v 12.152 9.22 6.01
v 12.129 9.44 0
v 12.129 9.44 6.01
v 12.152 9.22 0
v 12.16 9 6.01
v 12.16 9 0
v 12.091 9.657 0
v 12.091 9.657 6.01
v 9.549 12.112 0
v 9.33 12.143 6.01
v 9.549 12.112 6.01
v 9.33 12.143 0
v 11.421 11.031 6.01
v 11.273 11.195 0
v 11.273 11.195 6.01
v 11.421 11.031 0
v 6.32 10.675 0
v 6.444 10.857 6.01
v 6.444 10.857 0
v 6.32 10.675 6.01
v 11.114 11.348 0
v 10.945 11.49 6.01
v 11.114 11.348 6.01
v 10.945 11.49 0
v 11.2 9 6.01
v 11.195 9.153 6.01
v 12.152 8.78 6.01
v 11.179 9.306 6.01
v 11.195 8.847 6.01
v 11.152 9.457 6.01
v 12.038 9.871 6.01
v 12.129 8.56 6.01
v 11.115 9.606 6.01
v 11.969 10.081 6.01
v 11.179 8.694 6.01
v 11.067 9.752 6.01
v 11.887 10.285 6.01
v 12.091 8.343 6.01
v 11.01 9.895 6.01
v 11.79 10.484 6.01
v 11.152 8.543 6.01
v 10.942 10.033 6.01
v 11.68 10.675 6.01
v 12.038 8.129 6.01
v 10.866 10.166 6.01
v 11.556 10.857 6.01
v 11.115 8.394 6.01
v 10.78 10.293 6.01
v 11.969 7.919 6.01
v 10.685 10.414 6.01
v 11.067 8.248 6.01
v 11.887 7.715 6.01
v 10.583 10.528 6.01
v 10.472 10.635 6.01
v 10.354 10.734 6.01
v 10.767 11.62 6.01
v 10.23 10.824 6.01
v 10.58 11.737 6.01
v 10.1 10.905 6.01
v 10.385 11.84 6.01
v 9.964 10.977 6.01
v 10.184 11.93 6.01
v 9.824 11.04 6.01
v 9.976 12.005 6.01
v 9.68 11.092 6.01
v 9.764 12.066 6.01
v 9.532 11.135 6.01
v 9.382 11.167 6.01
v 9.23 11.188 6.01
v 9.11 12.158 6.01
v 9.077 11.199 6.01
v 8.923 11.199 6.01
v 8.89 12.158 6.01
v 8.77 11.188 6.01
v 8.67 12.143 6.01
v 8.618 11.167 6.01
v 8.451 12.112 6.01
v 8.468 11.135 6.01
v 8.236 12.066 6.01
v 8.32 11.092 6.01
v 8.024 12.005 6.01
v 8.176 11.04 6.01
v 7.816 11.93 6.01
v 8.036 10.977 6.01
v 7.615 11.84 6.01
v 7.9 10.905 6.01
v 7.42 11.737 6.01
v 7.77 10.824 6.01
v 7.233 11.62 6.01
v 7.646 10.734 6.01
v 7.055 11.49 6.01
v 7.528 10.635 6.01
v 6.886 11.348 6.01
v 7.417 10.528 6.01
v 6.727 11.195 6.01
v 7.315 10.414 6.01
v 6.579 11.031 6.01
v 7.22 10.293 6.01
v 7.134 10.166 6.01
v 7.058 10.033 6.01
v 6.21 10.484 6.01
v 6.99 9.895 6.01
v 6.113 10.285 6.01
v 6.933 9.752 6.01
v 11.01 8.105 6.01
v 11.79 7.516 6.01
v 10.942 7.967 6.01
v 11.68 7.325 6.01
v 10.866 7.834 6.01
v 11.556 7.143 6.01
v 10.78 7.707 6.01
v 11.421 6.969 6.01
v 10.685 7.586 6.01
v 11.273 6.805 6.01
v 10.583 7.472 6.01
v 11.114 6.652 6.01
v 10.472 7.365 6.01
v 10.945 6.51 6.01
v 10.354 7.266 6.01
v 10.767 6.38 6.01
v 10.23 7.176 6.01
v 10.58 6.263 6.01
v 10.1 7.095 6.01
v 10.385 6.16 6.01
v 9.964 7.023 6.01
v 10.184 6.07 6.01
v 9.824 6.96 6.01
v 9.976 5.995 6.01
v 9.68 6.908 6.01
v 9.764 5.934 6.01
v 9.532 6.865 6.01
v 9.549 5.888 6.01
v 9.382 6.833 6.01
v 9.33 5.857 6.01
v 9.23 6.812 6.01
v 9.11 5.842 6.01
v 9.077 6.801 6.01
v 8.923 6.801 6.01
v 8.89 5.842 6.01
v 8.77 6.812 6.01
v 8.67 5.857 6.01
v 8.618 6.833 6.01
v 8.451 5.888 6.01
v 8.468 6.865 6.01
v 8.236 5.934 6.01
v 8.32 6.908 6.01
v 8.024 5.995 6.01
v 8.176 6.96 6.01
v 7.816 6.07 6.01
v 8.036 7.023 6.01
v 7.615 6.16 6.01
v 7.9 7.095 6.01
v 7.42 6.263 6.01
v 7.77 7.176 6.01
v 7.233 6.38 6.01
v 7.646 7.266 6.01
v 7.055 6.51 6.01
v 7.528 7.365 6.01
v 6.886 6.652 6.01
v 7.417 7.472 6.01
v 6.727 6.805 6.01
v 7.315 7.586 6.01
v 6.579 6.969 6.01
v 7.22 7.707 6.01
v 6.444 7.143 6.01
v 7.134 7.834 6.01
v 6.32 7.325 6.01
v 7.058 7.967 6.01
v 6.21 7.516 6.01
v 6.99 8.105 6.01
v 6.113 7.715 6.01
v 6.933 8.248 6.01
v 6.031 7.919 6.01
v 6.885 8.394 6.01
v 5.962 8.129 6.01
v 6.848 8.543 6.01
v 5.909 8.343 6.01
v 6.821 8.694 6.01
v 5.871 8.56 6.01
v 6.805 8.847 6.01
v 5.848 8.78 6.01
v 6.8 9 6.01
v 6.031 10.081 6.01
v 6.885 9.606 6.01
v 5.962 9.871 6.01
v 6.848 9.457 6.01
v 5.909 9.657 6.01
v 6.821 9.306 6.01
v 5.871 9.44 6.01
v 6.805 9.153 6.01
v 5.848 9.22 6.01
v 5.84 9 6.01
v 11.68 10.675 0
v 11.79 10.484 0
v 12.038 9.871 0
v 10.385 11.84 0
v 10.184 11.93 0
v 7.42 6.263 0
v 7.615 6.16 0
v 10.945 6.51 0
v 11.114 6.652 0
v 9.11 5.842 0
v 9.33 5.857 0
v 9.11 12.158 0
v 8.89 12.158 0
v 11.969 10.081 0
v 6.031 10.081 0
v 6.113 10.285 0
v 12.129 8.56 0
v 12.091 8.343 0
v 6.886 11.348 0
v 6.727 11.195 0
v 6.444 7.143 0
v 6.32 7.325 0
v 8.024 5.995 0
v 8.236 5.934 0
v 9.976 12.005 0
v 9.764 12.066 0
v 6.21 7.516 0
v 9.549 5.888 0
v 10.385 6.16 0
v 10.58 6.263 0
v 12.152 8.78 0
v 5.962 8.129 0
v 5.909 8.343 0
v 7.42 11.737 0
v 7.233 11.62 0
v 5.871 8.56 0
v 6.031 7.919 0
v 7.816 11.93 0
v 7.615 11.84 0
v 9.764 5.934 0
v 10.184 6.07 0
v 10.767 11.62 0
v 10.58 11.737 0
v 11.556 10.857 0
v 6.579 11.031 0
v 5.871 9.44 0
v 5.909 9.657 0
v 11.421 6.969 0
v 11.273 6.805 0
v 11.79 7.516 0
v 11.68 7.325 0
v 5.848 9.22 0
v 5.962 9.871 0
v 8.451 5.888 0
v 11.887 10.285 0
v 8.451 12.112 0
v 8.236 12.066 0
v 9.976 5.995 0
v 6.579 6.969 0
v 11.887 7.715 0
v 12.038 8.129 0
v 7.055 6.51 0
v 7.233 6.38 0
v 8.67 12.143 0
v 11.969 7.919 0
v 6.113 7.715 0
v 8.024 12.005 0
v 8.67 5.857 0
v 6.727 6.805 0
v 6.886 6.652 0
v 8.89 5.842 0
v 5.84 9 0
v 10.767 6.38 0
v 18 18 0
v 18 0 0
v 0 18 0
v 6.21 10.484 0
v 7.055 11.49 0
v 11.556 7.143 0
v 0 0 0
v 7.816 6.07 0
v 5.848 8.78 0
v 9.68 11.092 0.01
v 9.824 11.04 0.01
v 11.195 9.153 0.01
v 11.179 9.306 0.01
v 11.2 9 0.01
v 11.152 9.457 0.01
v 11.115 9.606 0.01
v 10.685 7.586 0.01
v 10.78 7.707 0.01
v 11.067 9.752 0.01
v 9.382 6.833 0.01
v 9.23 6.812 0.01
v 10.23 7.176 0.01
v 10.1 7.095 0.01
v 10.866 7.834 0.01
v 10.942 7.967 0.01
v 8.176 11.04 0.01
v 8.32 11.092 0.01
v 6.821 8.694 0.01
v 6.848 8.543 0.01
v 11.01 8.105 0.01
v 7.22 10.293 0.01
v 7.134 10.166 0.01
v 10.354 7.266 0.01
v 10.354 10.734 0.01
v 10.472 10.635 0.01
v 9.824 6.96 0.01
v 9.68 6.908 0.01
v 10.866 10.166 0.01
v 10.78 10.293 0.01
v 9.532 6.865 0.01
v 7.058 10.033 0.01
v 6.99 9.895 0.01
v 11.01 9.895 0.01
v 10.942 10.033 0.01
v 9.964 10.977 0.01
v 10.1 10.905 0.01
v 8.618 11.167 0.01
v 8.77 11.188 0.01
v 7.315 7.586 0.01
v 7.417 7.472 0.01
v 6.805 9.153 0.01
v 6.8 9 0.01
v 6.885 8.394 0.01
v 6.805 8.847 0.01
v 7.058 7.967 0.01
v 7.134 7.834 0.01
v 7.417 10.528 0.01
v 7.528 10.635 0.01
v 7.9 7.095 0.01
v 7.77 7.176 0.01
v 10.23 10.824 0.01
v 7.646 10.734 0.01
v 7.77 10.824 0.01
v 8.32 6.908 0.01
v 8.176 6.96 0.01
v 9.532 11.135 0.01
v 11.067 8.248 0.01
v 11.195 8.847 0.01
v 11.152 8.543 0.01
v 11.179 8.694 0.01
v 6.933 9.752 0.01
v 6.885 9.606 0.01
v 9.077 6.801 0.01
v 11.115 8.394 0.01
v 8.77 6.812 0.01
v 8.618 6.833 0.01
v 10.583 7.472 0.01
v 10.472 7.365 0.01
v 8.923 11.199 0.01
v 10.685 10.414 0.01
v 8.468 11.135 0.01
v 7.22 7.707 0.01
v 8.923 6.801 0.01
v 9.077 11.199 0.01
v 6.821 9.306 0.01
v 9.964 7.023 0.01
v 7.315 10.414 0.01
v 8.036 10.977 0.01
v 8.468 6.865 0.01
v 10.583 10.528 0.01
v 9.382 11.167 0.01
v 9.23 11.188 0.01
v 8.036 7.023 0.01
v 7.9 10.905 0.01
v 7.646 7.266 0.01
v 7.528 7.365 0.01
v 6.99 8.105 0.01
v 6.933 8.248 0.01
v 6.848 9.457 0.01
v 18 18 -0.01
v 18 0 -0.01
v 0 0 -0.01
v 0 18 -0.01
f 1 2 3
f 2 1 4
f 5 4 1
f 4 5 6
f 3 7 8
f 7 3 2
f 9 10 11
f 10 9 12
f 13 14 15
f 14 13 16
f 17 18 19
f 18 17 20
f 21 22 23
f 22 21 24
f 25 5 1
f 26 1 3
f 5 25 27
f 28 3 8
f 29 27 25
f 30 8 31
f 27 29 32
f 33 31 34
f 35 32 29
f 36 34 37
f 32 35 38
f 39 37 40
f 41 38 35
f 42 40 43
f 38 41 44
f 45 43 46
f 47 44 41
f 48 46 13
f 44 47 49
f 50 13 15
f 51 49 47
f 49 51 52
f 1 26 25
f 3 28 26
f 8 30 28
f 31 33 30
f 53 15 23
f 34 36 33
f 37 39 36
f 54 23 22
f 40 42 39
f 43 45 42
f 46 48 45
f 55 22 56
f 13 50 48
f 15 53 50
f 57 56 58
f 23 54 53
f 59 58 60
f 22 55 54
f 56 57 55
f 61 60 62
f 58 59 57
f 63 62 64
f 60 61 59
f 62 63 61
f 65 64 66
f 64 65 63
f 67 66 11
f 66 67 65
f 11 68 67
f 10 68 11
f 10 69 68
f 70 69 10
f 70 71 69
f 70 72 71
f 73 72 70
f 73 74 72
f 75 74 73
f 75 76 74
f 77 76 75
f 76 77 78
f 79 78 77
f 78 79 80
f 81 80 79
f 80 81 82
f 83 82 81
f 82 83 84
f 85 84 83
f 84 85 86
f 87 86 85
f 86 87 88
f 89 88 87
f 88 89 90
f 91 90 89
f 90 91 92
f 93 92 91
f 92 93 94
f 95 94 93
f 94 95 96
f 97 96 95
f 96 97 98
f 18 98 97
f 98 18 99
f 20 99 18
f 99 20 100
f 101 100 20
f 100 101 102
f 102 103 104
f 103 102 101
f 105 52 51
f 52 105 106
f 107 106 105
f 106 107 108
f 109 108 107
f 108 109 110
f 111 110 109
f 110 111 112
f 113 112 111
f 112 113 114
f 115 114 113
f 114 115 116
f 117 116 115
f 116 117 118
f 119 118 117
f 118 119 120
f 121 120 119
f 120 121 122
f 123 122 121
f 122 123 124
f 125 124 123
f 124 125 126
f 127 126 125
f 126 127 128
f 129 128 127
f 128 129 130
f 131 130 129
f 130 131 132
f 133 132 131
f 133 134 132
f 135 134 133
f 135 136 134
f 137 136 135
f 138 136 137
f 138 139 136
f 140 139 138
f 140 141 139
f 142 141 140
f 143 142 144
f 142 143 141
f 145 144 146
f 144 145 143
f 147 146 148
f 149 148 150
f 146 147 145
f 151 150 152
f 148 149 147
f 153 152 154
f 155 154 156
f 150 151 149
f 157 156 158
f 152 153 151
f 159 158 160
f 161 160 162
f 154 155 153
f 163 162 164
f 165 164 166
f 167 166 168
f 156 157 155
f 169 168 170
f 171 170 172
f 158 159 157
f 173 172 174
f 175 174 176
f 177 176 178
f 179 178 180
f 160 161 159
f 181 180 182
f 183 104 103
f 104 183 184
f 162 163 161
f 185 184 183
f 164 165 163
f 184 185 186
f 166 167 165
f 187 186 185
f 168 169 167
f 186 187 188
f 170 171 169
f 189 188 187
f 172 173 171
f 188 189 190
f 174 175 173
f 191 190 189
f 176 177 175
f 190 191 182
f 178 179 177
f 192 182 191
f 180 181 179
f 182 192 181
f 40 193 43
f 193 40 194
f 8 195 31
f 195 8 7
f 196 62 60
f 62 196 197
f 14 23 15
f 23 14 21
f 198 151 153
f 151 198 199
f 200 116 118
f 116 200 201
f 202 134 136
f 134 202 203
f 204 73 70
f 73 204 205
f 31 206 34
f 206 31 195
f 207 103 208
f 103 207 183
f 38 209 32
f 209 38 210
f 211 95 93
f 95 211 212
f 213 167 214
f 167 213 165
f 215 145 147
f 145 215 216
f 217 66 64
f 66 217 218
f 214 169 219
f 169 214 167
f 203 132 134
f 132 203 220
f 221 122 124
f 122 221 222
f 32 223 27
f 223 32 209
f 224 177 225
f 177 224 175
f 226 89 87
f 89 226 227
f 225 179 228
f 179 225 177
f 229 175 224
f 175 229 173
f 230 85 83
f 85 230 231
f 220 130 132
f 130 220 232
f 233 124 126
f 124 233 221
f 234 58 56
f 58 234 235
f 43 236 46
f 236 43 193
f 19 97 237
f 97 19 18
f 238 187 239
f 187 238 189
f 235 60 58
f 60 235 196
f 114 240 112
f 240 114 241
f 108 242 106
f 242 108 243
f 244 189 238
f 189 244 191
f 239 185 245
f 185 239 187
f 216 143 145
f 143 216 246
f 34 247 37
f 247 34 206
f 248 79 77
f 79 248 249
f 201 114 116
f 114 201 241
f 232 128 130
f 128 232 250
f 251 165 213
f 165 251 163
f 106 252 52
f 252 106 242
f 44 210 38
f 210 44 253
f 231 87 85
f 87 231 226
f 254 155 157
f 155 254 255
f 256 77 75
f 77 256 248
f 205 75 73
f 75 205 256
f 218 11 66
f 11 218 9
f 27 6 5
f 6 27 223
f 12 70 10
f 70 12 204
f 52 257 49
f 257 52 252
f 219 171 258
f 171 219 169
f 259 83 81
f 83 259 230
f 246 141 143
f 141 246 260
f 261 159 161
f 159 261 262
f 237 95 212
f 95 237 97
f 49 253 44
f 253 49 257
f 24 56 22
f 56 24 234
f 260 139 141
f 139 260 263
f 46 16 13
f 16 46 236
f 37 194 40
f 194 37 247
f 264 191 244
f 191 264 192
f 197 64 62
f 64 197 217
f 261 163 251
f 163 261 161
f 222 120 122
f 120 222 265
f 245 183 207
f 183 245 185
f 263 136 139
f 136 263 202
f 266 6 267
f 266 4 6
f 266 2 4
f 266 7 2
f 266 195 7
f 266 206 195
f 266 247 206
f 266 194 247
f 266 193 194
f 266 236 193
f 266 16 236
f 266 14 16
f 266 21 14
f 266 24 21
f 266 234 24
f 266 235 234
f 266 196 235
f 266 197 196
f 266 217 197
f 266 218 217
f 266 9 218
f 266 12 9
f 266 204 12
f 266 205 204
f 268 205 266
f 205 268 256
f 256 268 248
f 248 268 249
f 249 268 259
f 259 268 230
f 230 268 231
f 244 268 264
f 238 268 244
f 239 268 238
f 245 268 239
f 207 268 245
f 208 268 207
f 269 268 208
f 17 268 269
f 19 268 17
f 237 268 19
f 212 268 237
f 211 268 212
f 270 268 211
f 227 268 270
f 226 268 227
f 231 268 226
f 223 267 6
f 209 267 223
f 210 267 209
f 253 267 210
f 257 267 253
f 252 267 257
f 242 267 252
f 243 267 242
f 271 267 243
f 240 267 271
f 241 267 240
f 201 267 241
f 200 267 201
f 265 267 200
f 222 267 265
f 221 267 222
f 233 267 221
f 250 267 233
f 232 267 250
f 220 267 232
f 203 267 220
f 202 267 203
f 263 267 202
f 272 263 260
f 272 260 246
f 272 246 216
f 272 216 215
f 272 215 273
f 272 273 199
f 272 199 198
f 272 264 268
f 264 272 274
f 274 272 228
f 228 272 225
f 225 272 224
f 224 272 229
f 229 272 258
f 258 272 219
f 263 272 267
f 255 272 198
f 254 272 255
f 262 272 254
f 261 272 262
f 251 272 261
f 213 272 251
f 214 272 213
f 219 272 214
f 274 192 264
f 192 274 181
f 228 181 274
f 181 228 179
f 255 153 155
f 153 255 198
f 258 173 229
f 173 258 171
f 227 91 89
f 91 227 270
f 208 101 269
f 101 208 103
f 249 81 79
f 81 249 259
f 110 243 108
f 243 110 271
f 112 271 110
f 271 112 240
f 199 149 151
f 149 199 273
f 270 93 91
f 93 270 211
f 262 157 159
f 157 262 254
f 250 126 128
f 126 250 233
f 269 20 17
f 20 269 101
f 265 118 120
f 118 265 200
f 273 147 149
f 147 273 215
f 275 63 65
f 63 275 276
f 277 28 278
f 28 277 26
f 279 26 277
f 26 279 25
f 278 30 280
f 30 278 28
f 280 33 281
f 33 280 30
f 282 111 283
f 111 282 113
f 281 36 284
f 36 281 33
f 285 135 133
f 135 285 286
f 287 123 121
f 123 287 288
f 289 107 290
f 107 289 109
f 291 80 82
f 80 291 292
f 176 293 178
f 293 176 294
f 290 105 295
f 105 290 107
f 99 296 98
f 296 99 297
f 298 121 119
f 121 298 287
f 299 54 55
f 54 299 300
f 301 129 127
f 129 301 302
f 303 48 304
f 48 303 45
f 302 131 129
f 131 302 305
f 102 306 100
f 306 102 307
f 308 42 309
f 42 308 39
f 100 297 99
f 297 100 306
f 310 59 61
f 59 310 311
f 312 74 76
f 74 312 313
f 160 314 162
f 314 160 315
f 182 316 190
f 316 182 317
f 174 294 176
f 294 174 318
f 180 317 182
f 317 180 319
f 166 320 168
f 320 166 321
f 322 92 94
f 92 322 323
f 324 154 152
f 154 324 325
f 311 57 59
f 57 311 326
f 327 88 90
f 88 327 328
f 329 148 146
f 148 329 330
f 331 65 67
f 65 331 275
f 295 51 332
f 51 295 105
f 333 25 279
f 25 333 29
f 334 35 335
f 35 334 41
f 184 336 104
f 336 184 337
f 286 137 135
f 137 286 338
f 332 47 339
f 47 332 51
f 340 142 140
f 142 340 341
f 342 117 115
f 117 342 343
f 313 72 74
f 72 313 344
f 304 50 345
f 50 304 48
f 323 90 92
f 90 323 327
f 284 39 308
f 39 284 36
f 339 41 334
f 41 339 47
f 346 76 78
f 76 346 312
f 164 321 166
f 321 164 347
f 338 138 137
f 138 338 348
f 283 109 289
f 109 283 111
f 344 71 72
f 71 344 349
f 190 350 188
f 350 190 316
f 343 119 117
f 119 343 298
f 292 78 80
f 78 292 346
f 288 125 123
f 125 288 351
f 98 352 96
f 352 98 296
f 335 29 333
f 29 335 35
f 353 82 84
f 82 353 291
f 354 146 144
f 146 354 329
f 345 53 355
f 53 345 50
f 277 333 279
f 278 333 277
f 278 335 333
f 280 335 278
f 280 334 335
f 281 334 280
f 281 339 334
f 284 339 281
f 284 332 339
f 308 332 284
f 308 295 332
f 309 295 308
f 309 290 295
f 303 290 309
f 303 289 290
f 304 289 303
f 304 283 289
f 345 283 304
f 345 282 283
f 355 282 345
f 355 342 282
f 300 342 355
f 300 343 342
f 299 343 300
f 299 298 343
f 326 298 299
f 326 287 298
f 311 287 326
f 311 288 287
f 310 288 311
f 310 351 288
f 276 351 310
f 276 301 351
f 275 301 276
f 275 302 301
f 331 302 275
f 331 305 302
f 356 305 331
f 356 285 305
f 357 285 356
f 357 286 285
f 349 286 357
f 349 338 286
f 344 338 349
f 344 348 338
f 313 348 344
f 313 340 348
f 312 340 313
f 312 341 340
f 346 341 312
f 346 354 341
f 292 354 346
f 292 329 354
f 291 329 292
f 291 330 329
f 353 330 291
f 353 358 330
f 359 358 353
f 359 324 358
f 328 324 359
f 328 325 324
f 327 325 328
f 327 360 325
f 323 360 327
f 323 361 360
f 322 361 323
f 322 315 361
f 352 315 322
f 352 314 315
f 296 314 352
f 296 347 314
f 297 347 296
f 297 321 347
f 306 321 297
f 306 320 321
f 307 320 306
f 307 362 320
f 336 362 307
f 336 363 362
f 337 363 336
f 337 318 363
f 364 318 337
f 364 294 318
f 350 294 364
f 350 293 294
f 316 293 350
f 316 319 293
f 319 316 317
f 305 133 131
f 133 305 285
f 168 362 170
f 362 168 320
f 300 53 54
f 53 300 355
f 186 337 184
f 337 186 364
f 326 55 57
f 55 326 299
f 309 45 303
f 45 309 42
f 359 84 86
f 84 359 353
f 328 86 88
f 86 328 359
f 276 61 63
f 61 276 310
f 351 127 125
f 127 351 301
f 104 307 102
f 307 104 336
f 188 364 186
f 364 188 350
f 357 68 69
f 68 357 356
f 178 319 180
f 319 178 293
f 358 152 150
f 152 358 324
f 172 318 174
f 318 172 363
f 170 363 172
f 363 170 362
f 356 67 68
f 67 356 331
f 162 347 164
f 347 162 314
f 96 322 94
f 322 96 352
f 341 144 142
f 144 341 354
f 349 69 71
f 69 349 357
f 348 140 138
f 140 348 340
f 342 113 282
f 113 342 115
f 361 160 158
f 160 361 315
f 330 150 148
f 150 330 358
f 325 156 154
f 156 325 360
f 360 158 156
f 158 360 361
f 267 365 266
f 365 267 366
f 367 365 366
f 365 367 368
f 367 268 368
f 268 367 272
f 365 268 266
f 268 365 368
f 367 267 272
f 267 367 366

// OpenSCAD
// file: ../Base/PlacementOptions.scad
// Fischertechnik Box Foundation
// Placement Options

// Alignment
NoAlign = 0;
AlignLeft = 1;
AlignBottom = 2;
AlignCenter = 3;
AlignRight = 4;
AlignTop = 5;

// Element rotation degree steps
rotations = [0, -90, -180, -270];

// Rotation
NoRotation = 0;
Rotate0 = 0;
Rotate90 = 1;
Rotate180 = 2;
Rotate270 = 3;

// Docking (seen from above)
NoDock = -1;
DockLeft = 0;
DockTop = 1;
DockRight = 2;
DockCorner = 2;
DockBottom = 3;

// Web corners
LowerLeft = 0;
UpperLeft = 1;
UpperRight = 2;
LowerRight = 3;

// Web position relative to corner
LeftOfCorner = 0;
RightOfCorner = 1;
// file: ../Base/Boxes.scad
// Fischertechnik Box Foundation
// Pre-designed Boxes

use <Constants.scad>

include <PlacementOptions.scad>

box190Width = 190;
box190Depth = 130;
box130Width = 130;
box130Depth = 95;
boxUsageHeight = 33.9;
boxWallThickness = 2.4;
boxBaseThickness = 1.0;
boxWebWidth = 3.0;

// getBoxWallThickness()
// Gets the wall thickness of a Fischertechnik Box

function getBoxWallThickness() = boxWallThickness;

// Gets the usable height of a fischertechnik box
function getBoxUsageHeight() = boxUsageHeight;

// Gets the thickness of the Fischertechnik box base.
function getBoxBaseThickness() = boxBaseThickness;

// Gets the width of a box web
function getBoxWebWidth() = boxWebWidth;

// Gets the usable inner space of a Box 190 as an x/y-list
function getBox190Space() = [
    box190Width - 2*getBoxWallThickness(), 
    box190Depth - 2*getBoxWallThickness() ];

// Imports the Fischertechnik empty box 130x190 mm and places it at position 0,0
// 190x130 are the outer sizes, the inner space is slightly smaller. Use getBox190Space() to get the inner sizes.
// This module needs the STL file "Fischertechnik Box 130x190.stl" in the library path.
// The box is positioned that the usable inner space is at the 0,0,0 position. The

module Box190() {
    translate([-getBoxWallThickness(),-getBoxWallThickness(),-getBoxBaseThickness()])
        import("Fischertechnik Box 130x190.stl", convexity=3);
}

// Gets the usable inner space of a Box 130 as an x/y-list
function getBox130Space() = [
    box130Width - 2*getBoxWallThickness(), 
    box130Depth - 2*getBoxWallThickness() ];

// Imports the Fischertechnik empty box 95x130 mm and places it at position 0,0
// 190x130 are the outer sizes, the inner space is slightly smaller. Use getBox190Space() to get the inner sizes.
// This module needs the STL file "Fischertechnik Box 95x130.stl" in the library path.
// The box is positioned that the usable inner space is at the 0,0,0 position. The

module Box130() {
    translate([-getBoxWallThickness(),-getBoxWallThickness(),-getBoxBaseThickness()])
        import("Fischertechnik Box 95x130.stl", convexity=3);
}

// Creates a web at the specified box walls
// corner 0 = LowerLeft, 1 = UpperLeft, 2 = UpperRight, 3 = LowerRight
// side 0 = LeftOfCorner, 1 = RightOfCorner
// distance = Distance in mm from the corner
// box = inner width and depth of the box (default: Box 190)
// webWidth = length of the web (default is 3 mms)
// webThickness = thickness of the web (default is 1 mm)

module BoxWeb(corner, side, distance, box=getBox190Space(), webWidth=getBoxWebWidth(), webThickness=1.0) {
    sink = getBoxWallThickness()/2;

    width = (corner % 2 == 0) ? 
            (side == LeftOfCorner ? webWidth : webThickness) :
            (side == LeftOfCorner ? webThickness : webWidth);

    depth = (corner % 2 == 0) ? 
            (side == RightOfCorner ? webWidth : webThickness) :
            (side == RightOfCorner ? webThickness : webWidth);
    
    xDiff = corner == LowerLeft ? 
                (side == LeftOfCorner ? -sink : distance) :
            (corner == UpperLeft ?                
                (side == LeftOfCorner ? distance : -sink) :
            (corner == UpperRight ?
                (side == LeftOfCorner ? box.x-webWidth+sink : box.x-distance-webThickness) :
                (side == LeftOfCorner ? box.x-distance-webThickness: box.x-webWidth+sink)));

    yDiff = corner == LowerLeft ? 
                (side == RightOfCorner ? -sink : distance) :
            (corner == UpperLeft ?
                (side == RightOfCorner ? box.y-distance : box.y-webWidth+sink) :
            (corner == UpperRight ?
                (side == RightOfCorner ? box.y-webWidth+sink : box.y-distance) :
                (side == RightOfCorner ? distance : -sink)));
    
    translate([xDiff, yDiff, -getExcess()])
        cube([width, depth, boxUsageHeight + 2*getExcess()]);
}
// file: ../Base/Rotation.scad
// Fischertechnik Box Foundation
// Geometry Helpers Rotation

include <PlacementOptions.scad>

// getRotatedSpace(space, rotation=NoRotation)
// Rotates the space dependent on the specified rotation

function getRotatedSpace(space, rotation=NoRotation) = [
    (rotation == Rotate90 || rotation == Rotate270) ? space.y : space.x,
    (rotation == Rotate90 || rotation == Rotate270) ? space.x : space.y
];

// Rotates the given space around the fixed left lower corner
// space = the space the children needs as width/depth list [width,depth]
// rotation = 0 Rotate0 degrees, 1 Rotate90 degrees, 2 Rotate180 degrees, 3 Rotate270 degrees (equivalent to -90)

module RotateFix(space, rotation=Rotate0) {
    dy = (rotation == Rotate0 || rotation == Rotate270) ? 0 :
        (rotation == Rotate90) ? space.x :
        space.y;
    dx = (rotation < Rotate180) ? 0 :
        (rotation == Rotate180) ? space.x :
        space.y;
    
    translate([dx, dy, 0])
        rotate([0, 0, rotations[rotation]])
            children();
}
// file: ../Base/Alignment.scad
// Fischertechnik Box Foundation
// Geometry Helpers Alignment

include <PlacementOptions.scad>

// getAlignedX(elementWidth, spaceWidth, align=AlignRight, offset=0)
// Gets the aligned X offset of an element with the given
// width in the given space.
// elementWidth = The width of the element to positon
// spaceWidth = The space where the element should be aligned
// align = 0 AlignLeft, 1 AlignCenter, 2 AlignRight
// offset = an optional offset from the aligned position. When
// aligned left or centered, then positive values are in X direction.
// When aligned right then positive values are in negative X direction.

function getAlignedX(elementWidth, spaceWidth, align=AlignRight, offset=0) =
    (align == AlignLeft) ?
        offset :
        ((align == AlignCenter) ?
        (spaceWidth - elementWidth)/2 + offset :
        spaceWidth - offset - elementWidth);

// getAlignedY(elementDepth, spaceDepth, align=AlignTop, offset=0)
// Gets the aligned Y offset of an element with the given
// depth in the given space.
// elementDepth = The depth of the element to positon
// spaceDepth = The space where the element should be aligned
// align = 0 AlignBottom, 1 AlignCenter, 2 AlignTop
// offset = an optional offset from the aligned position. When
// aligned bottom or centered, then positive values are in Y direction.
// When aligned top then positive values are in negative Y direction.

function getAlignedY(elementDepth, spaceDepth, align=AlignTop, offset=0) =
    (align == AlignBottom) ?
        offset :
        ((align == AlignCenter) ?
        (spaceDepth - elementDepth)/2 + offset :
        spaceDepth - offset - elementDepth);
// file: ../Base/Placement.scad
// Fischertechnik Box Foundation
// Geometry Helpers Placement

use <Constants.scad>
use <Alignment.scad>
use <Rotation.scad>
use <Boxes.scad>

include <PlacementOptions.scad>

// Place(x=0, y=0, elementSpace=[0,0], alignX=AlignLeft, alignY=AlignBottom, rotation=Rotate0, boxSpace=getBox190Space())
// Places the child at the specified position
// y = Y-Position. This is a relative position when an X aligment is specified.
// x = X-Position. This is a relative position when an Y aligment is specified.
// elementSpace = space of the element to be placed [x,y]
// alignX = -1=NoAlign, 0 AlignLeft, 1 AlignCenter, 3 AlignRight (elementSpace and boxSpace required!)
// alignY = -1=NoAlign, 2 AlignBottom, 1 AlignCenter, 4 AlignTop (elementSpace and boxSpace required!)
// rotation = 0 Rotate0 0 degrees, 1 Rotate90 90 degrees, 
// 2 Rotate180 180 degrees, 3 Rotate270 270 degrees (equivalent to -90)
// boxSpace = Inner space of the box where the placement occurs [x,y] - default is Box 190x130 inner space

module Place(x=0, y=0, elementSpace=[0,0], 
  alignX=AlignLeft, alignY=AlignBottom, 
  rotation=NoRotation, boxSpace=getBox190Space()) {

    module Position(x, y, space, rotation=Rotate0) {
        translate([x, y, 0])
            RotateFix(space, rotation)
                children();
    }

    space = getRotatedSpace(elementSpace, rotation);
    alignedX = getAlignedX(space.x, boxSpace.x, alignX, x);
    alignedY = getAlignedY(space.y, boxSpace.y, alignY, y);
    Position(alignedX, alignedY, elementSpace, rotation)
        children();
}

// Center(space=getBox130Space(), elementSpace=[0,0])
// space = Space where the children is centered. For cylinder use centered=true and no elementSpace.
// elementSpace = space of the element to be centered [x,y]

module Center(space=getBox190Space(), elementSpace=[0,0]) {
    translate([(space.x - elementSpace.x) / 2, (space.y - elementSpace.y) / 2])
        children(0);
}

// CenterHorizontal(width=0, y=0, offset=0, space=getBox130Space())
// space = Space where the children is centered. For cylinder use centered=true and no elementSpace.
// elementSpace = space of the element to be centered [x,y]

module CenterHorizontal(width=0, y=0, offset=0, space=getBox190Space()) {
    translate([(space.x - width) / 2 + offset, y])
        children(0);
}

// CenterVertical(depth=0, x=0, offset=0, space=getBox130Space())
// space = Space where the children is centered. For cylinder use centered=true and no elementSpace.
// elementSpace = space of the element to be centered [x,y]

module CenterVertical(depth=0, x=0, offset=0, space=getBox190Space()) {
    translate([x, (space.y - depth) / 2 + offset])
        children(0);
}
// file: ../Base/Constants.scad
// Fischertechnik Box Foundation
// Constants

// Constant values necessary for multiple elements

// Base constants
dividerThickness = 1.2;
excess = 0.01;
fragments = 90;
tolerance = 0.8;

// Gets the thickness of a divider 
function getDividerThickness() = dividerThickness;

// Gets the excess that is used to merge walls into each other
function getExcess() = excess;

// Gets amount of fragments of a cylinder
function getFragments() = fragments;

// Gets the inner tolerance of a frame to each side
function getTolerance() = tolerance;


// Fischertechnik specific constants
axisDiameter = 4;
axisBottomDiameter = axisDiameter + 1;
standardEdgeDistance = 2.5;
standardWebDistance = 11.5;
standardCornerLength = 15;
tubeWallFactor = 0.8;

// Gets axis diameter
function getAxisDiameter() = axisDiameter;

// Gets axis bottom diameter for thicker part at the bottom
function getAxisBottomDiameter() = axisBottomDiameter;

// gets the standard distance to the wall of the box for dockable frames with webs
function getStandardEdgeDistance() = standardEdgeDistance;

// gets the standard distance of each web to the corner of the dockable frame
function getStandardWebDistance() = standardWebDistance;

// gets the standard length of the corner walls of a dockable frame
function getStandardCornerLength() = standardCornerLength;

// gets the wall thickness of a tube.
function getTubeWallThickness() = tubeWallFactor * getDividerThickness();
// main file
// Fischertechnik Box Library
// Cylinder for standing step-up/step-down cog
// 31052

use <../Base/Constants.scad>
use <../Base/Placement.scad>
use <../ModelBase/Simple.scad>
use <../ModelBase/Complex.scad>

width = 18;
depth = 18;
height = 6;

// getCylinderStepUpDownCogSpace()
// Gets the space the cylinder for a step-up/step-down cog needs

function getCylinderStepUpDownCogSpace() = [width, depth, height];

// CylinderAxis30()
// Standing cylinder for a step-up/step-down cog (mot1)
// 31052

module CylinderStepUpDownCog() {
    Space(getCylinderStepUpDownCogSpace());
    
    Center(getCylinderStepUpDownCogSpace())
        Tube(height, innerDiameter=getFrameAxisDepth());
}

// Tests
color("lightgray")
CylinderStepUpDownCog();
